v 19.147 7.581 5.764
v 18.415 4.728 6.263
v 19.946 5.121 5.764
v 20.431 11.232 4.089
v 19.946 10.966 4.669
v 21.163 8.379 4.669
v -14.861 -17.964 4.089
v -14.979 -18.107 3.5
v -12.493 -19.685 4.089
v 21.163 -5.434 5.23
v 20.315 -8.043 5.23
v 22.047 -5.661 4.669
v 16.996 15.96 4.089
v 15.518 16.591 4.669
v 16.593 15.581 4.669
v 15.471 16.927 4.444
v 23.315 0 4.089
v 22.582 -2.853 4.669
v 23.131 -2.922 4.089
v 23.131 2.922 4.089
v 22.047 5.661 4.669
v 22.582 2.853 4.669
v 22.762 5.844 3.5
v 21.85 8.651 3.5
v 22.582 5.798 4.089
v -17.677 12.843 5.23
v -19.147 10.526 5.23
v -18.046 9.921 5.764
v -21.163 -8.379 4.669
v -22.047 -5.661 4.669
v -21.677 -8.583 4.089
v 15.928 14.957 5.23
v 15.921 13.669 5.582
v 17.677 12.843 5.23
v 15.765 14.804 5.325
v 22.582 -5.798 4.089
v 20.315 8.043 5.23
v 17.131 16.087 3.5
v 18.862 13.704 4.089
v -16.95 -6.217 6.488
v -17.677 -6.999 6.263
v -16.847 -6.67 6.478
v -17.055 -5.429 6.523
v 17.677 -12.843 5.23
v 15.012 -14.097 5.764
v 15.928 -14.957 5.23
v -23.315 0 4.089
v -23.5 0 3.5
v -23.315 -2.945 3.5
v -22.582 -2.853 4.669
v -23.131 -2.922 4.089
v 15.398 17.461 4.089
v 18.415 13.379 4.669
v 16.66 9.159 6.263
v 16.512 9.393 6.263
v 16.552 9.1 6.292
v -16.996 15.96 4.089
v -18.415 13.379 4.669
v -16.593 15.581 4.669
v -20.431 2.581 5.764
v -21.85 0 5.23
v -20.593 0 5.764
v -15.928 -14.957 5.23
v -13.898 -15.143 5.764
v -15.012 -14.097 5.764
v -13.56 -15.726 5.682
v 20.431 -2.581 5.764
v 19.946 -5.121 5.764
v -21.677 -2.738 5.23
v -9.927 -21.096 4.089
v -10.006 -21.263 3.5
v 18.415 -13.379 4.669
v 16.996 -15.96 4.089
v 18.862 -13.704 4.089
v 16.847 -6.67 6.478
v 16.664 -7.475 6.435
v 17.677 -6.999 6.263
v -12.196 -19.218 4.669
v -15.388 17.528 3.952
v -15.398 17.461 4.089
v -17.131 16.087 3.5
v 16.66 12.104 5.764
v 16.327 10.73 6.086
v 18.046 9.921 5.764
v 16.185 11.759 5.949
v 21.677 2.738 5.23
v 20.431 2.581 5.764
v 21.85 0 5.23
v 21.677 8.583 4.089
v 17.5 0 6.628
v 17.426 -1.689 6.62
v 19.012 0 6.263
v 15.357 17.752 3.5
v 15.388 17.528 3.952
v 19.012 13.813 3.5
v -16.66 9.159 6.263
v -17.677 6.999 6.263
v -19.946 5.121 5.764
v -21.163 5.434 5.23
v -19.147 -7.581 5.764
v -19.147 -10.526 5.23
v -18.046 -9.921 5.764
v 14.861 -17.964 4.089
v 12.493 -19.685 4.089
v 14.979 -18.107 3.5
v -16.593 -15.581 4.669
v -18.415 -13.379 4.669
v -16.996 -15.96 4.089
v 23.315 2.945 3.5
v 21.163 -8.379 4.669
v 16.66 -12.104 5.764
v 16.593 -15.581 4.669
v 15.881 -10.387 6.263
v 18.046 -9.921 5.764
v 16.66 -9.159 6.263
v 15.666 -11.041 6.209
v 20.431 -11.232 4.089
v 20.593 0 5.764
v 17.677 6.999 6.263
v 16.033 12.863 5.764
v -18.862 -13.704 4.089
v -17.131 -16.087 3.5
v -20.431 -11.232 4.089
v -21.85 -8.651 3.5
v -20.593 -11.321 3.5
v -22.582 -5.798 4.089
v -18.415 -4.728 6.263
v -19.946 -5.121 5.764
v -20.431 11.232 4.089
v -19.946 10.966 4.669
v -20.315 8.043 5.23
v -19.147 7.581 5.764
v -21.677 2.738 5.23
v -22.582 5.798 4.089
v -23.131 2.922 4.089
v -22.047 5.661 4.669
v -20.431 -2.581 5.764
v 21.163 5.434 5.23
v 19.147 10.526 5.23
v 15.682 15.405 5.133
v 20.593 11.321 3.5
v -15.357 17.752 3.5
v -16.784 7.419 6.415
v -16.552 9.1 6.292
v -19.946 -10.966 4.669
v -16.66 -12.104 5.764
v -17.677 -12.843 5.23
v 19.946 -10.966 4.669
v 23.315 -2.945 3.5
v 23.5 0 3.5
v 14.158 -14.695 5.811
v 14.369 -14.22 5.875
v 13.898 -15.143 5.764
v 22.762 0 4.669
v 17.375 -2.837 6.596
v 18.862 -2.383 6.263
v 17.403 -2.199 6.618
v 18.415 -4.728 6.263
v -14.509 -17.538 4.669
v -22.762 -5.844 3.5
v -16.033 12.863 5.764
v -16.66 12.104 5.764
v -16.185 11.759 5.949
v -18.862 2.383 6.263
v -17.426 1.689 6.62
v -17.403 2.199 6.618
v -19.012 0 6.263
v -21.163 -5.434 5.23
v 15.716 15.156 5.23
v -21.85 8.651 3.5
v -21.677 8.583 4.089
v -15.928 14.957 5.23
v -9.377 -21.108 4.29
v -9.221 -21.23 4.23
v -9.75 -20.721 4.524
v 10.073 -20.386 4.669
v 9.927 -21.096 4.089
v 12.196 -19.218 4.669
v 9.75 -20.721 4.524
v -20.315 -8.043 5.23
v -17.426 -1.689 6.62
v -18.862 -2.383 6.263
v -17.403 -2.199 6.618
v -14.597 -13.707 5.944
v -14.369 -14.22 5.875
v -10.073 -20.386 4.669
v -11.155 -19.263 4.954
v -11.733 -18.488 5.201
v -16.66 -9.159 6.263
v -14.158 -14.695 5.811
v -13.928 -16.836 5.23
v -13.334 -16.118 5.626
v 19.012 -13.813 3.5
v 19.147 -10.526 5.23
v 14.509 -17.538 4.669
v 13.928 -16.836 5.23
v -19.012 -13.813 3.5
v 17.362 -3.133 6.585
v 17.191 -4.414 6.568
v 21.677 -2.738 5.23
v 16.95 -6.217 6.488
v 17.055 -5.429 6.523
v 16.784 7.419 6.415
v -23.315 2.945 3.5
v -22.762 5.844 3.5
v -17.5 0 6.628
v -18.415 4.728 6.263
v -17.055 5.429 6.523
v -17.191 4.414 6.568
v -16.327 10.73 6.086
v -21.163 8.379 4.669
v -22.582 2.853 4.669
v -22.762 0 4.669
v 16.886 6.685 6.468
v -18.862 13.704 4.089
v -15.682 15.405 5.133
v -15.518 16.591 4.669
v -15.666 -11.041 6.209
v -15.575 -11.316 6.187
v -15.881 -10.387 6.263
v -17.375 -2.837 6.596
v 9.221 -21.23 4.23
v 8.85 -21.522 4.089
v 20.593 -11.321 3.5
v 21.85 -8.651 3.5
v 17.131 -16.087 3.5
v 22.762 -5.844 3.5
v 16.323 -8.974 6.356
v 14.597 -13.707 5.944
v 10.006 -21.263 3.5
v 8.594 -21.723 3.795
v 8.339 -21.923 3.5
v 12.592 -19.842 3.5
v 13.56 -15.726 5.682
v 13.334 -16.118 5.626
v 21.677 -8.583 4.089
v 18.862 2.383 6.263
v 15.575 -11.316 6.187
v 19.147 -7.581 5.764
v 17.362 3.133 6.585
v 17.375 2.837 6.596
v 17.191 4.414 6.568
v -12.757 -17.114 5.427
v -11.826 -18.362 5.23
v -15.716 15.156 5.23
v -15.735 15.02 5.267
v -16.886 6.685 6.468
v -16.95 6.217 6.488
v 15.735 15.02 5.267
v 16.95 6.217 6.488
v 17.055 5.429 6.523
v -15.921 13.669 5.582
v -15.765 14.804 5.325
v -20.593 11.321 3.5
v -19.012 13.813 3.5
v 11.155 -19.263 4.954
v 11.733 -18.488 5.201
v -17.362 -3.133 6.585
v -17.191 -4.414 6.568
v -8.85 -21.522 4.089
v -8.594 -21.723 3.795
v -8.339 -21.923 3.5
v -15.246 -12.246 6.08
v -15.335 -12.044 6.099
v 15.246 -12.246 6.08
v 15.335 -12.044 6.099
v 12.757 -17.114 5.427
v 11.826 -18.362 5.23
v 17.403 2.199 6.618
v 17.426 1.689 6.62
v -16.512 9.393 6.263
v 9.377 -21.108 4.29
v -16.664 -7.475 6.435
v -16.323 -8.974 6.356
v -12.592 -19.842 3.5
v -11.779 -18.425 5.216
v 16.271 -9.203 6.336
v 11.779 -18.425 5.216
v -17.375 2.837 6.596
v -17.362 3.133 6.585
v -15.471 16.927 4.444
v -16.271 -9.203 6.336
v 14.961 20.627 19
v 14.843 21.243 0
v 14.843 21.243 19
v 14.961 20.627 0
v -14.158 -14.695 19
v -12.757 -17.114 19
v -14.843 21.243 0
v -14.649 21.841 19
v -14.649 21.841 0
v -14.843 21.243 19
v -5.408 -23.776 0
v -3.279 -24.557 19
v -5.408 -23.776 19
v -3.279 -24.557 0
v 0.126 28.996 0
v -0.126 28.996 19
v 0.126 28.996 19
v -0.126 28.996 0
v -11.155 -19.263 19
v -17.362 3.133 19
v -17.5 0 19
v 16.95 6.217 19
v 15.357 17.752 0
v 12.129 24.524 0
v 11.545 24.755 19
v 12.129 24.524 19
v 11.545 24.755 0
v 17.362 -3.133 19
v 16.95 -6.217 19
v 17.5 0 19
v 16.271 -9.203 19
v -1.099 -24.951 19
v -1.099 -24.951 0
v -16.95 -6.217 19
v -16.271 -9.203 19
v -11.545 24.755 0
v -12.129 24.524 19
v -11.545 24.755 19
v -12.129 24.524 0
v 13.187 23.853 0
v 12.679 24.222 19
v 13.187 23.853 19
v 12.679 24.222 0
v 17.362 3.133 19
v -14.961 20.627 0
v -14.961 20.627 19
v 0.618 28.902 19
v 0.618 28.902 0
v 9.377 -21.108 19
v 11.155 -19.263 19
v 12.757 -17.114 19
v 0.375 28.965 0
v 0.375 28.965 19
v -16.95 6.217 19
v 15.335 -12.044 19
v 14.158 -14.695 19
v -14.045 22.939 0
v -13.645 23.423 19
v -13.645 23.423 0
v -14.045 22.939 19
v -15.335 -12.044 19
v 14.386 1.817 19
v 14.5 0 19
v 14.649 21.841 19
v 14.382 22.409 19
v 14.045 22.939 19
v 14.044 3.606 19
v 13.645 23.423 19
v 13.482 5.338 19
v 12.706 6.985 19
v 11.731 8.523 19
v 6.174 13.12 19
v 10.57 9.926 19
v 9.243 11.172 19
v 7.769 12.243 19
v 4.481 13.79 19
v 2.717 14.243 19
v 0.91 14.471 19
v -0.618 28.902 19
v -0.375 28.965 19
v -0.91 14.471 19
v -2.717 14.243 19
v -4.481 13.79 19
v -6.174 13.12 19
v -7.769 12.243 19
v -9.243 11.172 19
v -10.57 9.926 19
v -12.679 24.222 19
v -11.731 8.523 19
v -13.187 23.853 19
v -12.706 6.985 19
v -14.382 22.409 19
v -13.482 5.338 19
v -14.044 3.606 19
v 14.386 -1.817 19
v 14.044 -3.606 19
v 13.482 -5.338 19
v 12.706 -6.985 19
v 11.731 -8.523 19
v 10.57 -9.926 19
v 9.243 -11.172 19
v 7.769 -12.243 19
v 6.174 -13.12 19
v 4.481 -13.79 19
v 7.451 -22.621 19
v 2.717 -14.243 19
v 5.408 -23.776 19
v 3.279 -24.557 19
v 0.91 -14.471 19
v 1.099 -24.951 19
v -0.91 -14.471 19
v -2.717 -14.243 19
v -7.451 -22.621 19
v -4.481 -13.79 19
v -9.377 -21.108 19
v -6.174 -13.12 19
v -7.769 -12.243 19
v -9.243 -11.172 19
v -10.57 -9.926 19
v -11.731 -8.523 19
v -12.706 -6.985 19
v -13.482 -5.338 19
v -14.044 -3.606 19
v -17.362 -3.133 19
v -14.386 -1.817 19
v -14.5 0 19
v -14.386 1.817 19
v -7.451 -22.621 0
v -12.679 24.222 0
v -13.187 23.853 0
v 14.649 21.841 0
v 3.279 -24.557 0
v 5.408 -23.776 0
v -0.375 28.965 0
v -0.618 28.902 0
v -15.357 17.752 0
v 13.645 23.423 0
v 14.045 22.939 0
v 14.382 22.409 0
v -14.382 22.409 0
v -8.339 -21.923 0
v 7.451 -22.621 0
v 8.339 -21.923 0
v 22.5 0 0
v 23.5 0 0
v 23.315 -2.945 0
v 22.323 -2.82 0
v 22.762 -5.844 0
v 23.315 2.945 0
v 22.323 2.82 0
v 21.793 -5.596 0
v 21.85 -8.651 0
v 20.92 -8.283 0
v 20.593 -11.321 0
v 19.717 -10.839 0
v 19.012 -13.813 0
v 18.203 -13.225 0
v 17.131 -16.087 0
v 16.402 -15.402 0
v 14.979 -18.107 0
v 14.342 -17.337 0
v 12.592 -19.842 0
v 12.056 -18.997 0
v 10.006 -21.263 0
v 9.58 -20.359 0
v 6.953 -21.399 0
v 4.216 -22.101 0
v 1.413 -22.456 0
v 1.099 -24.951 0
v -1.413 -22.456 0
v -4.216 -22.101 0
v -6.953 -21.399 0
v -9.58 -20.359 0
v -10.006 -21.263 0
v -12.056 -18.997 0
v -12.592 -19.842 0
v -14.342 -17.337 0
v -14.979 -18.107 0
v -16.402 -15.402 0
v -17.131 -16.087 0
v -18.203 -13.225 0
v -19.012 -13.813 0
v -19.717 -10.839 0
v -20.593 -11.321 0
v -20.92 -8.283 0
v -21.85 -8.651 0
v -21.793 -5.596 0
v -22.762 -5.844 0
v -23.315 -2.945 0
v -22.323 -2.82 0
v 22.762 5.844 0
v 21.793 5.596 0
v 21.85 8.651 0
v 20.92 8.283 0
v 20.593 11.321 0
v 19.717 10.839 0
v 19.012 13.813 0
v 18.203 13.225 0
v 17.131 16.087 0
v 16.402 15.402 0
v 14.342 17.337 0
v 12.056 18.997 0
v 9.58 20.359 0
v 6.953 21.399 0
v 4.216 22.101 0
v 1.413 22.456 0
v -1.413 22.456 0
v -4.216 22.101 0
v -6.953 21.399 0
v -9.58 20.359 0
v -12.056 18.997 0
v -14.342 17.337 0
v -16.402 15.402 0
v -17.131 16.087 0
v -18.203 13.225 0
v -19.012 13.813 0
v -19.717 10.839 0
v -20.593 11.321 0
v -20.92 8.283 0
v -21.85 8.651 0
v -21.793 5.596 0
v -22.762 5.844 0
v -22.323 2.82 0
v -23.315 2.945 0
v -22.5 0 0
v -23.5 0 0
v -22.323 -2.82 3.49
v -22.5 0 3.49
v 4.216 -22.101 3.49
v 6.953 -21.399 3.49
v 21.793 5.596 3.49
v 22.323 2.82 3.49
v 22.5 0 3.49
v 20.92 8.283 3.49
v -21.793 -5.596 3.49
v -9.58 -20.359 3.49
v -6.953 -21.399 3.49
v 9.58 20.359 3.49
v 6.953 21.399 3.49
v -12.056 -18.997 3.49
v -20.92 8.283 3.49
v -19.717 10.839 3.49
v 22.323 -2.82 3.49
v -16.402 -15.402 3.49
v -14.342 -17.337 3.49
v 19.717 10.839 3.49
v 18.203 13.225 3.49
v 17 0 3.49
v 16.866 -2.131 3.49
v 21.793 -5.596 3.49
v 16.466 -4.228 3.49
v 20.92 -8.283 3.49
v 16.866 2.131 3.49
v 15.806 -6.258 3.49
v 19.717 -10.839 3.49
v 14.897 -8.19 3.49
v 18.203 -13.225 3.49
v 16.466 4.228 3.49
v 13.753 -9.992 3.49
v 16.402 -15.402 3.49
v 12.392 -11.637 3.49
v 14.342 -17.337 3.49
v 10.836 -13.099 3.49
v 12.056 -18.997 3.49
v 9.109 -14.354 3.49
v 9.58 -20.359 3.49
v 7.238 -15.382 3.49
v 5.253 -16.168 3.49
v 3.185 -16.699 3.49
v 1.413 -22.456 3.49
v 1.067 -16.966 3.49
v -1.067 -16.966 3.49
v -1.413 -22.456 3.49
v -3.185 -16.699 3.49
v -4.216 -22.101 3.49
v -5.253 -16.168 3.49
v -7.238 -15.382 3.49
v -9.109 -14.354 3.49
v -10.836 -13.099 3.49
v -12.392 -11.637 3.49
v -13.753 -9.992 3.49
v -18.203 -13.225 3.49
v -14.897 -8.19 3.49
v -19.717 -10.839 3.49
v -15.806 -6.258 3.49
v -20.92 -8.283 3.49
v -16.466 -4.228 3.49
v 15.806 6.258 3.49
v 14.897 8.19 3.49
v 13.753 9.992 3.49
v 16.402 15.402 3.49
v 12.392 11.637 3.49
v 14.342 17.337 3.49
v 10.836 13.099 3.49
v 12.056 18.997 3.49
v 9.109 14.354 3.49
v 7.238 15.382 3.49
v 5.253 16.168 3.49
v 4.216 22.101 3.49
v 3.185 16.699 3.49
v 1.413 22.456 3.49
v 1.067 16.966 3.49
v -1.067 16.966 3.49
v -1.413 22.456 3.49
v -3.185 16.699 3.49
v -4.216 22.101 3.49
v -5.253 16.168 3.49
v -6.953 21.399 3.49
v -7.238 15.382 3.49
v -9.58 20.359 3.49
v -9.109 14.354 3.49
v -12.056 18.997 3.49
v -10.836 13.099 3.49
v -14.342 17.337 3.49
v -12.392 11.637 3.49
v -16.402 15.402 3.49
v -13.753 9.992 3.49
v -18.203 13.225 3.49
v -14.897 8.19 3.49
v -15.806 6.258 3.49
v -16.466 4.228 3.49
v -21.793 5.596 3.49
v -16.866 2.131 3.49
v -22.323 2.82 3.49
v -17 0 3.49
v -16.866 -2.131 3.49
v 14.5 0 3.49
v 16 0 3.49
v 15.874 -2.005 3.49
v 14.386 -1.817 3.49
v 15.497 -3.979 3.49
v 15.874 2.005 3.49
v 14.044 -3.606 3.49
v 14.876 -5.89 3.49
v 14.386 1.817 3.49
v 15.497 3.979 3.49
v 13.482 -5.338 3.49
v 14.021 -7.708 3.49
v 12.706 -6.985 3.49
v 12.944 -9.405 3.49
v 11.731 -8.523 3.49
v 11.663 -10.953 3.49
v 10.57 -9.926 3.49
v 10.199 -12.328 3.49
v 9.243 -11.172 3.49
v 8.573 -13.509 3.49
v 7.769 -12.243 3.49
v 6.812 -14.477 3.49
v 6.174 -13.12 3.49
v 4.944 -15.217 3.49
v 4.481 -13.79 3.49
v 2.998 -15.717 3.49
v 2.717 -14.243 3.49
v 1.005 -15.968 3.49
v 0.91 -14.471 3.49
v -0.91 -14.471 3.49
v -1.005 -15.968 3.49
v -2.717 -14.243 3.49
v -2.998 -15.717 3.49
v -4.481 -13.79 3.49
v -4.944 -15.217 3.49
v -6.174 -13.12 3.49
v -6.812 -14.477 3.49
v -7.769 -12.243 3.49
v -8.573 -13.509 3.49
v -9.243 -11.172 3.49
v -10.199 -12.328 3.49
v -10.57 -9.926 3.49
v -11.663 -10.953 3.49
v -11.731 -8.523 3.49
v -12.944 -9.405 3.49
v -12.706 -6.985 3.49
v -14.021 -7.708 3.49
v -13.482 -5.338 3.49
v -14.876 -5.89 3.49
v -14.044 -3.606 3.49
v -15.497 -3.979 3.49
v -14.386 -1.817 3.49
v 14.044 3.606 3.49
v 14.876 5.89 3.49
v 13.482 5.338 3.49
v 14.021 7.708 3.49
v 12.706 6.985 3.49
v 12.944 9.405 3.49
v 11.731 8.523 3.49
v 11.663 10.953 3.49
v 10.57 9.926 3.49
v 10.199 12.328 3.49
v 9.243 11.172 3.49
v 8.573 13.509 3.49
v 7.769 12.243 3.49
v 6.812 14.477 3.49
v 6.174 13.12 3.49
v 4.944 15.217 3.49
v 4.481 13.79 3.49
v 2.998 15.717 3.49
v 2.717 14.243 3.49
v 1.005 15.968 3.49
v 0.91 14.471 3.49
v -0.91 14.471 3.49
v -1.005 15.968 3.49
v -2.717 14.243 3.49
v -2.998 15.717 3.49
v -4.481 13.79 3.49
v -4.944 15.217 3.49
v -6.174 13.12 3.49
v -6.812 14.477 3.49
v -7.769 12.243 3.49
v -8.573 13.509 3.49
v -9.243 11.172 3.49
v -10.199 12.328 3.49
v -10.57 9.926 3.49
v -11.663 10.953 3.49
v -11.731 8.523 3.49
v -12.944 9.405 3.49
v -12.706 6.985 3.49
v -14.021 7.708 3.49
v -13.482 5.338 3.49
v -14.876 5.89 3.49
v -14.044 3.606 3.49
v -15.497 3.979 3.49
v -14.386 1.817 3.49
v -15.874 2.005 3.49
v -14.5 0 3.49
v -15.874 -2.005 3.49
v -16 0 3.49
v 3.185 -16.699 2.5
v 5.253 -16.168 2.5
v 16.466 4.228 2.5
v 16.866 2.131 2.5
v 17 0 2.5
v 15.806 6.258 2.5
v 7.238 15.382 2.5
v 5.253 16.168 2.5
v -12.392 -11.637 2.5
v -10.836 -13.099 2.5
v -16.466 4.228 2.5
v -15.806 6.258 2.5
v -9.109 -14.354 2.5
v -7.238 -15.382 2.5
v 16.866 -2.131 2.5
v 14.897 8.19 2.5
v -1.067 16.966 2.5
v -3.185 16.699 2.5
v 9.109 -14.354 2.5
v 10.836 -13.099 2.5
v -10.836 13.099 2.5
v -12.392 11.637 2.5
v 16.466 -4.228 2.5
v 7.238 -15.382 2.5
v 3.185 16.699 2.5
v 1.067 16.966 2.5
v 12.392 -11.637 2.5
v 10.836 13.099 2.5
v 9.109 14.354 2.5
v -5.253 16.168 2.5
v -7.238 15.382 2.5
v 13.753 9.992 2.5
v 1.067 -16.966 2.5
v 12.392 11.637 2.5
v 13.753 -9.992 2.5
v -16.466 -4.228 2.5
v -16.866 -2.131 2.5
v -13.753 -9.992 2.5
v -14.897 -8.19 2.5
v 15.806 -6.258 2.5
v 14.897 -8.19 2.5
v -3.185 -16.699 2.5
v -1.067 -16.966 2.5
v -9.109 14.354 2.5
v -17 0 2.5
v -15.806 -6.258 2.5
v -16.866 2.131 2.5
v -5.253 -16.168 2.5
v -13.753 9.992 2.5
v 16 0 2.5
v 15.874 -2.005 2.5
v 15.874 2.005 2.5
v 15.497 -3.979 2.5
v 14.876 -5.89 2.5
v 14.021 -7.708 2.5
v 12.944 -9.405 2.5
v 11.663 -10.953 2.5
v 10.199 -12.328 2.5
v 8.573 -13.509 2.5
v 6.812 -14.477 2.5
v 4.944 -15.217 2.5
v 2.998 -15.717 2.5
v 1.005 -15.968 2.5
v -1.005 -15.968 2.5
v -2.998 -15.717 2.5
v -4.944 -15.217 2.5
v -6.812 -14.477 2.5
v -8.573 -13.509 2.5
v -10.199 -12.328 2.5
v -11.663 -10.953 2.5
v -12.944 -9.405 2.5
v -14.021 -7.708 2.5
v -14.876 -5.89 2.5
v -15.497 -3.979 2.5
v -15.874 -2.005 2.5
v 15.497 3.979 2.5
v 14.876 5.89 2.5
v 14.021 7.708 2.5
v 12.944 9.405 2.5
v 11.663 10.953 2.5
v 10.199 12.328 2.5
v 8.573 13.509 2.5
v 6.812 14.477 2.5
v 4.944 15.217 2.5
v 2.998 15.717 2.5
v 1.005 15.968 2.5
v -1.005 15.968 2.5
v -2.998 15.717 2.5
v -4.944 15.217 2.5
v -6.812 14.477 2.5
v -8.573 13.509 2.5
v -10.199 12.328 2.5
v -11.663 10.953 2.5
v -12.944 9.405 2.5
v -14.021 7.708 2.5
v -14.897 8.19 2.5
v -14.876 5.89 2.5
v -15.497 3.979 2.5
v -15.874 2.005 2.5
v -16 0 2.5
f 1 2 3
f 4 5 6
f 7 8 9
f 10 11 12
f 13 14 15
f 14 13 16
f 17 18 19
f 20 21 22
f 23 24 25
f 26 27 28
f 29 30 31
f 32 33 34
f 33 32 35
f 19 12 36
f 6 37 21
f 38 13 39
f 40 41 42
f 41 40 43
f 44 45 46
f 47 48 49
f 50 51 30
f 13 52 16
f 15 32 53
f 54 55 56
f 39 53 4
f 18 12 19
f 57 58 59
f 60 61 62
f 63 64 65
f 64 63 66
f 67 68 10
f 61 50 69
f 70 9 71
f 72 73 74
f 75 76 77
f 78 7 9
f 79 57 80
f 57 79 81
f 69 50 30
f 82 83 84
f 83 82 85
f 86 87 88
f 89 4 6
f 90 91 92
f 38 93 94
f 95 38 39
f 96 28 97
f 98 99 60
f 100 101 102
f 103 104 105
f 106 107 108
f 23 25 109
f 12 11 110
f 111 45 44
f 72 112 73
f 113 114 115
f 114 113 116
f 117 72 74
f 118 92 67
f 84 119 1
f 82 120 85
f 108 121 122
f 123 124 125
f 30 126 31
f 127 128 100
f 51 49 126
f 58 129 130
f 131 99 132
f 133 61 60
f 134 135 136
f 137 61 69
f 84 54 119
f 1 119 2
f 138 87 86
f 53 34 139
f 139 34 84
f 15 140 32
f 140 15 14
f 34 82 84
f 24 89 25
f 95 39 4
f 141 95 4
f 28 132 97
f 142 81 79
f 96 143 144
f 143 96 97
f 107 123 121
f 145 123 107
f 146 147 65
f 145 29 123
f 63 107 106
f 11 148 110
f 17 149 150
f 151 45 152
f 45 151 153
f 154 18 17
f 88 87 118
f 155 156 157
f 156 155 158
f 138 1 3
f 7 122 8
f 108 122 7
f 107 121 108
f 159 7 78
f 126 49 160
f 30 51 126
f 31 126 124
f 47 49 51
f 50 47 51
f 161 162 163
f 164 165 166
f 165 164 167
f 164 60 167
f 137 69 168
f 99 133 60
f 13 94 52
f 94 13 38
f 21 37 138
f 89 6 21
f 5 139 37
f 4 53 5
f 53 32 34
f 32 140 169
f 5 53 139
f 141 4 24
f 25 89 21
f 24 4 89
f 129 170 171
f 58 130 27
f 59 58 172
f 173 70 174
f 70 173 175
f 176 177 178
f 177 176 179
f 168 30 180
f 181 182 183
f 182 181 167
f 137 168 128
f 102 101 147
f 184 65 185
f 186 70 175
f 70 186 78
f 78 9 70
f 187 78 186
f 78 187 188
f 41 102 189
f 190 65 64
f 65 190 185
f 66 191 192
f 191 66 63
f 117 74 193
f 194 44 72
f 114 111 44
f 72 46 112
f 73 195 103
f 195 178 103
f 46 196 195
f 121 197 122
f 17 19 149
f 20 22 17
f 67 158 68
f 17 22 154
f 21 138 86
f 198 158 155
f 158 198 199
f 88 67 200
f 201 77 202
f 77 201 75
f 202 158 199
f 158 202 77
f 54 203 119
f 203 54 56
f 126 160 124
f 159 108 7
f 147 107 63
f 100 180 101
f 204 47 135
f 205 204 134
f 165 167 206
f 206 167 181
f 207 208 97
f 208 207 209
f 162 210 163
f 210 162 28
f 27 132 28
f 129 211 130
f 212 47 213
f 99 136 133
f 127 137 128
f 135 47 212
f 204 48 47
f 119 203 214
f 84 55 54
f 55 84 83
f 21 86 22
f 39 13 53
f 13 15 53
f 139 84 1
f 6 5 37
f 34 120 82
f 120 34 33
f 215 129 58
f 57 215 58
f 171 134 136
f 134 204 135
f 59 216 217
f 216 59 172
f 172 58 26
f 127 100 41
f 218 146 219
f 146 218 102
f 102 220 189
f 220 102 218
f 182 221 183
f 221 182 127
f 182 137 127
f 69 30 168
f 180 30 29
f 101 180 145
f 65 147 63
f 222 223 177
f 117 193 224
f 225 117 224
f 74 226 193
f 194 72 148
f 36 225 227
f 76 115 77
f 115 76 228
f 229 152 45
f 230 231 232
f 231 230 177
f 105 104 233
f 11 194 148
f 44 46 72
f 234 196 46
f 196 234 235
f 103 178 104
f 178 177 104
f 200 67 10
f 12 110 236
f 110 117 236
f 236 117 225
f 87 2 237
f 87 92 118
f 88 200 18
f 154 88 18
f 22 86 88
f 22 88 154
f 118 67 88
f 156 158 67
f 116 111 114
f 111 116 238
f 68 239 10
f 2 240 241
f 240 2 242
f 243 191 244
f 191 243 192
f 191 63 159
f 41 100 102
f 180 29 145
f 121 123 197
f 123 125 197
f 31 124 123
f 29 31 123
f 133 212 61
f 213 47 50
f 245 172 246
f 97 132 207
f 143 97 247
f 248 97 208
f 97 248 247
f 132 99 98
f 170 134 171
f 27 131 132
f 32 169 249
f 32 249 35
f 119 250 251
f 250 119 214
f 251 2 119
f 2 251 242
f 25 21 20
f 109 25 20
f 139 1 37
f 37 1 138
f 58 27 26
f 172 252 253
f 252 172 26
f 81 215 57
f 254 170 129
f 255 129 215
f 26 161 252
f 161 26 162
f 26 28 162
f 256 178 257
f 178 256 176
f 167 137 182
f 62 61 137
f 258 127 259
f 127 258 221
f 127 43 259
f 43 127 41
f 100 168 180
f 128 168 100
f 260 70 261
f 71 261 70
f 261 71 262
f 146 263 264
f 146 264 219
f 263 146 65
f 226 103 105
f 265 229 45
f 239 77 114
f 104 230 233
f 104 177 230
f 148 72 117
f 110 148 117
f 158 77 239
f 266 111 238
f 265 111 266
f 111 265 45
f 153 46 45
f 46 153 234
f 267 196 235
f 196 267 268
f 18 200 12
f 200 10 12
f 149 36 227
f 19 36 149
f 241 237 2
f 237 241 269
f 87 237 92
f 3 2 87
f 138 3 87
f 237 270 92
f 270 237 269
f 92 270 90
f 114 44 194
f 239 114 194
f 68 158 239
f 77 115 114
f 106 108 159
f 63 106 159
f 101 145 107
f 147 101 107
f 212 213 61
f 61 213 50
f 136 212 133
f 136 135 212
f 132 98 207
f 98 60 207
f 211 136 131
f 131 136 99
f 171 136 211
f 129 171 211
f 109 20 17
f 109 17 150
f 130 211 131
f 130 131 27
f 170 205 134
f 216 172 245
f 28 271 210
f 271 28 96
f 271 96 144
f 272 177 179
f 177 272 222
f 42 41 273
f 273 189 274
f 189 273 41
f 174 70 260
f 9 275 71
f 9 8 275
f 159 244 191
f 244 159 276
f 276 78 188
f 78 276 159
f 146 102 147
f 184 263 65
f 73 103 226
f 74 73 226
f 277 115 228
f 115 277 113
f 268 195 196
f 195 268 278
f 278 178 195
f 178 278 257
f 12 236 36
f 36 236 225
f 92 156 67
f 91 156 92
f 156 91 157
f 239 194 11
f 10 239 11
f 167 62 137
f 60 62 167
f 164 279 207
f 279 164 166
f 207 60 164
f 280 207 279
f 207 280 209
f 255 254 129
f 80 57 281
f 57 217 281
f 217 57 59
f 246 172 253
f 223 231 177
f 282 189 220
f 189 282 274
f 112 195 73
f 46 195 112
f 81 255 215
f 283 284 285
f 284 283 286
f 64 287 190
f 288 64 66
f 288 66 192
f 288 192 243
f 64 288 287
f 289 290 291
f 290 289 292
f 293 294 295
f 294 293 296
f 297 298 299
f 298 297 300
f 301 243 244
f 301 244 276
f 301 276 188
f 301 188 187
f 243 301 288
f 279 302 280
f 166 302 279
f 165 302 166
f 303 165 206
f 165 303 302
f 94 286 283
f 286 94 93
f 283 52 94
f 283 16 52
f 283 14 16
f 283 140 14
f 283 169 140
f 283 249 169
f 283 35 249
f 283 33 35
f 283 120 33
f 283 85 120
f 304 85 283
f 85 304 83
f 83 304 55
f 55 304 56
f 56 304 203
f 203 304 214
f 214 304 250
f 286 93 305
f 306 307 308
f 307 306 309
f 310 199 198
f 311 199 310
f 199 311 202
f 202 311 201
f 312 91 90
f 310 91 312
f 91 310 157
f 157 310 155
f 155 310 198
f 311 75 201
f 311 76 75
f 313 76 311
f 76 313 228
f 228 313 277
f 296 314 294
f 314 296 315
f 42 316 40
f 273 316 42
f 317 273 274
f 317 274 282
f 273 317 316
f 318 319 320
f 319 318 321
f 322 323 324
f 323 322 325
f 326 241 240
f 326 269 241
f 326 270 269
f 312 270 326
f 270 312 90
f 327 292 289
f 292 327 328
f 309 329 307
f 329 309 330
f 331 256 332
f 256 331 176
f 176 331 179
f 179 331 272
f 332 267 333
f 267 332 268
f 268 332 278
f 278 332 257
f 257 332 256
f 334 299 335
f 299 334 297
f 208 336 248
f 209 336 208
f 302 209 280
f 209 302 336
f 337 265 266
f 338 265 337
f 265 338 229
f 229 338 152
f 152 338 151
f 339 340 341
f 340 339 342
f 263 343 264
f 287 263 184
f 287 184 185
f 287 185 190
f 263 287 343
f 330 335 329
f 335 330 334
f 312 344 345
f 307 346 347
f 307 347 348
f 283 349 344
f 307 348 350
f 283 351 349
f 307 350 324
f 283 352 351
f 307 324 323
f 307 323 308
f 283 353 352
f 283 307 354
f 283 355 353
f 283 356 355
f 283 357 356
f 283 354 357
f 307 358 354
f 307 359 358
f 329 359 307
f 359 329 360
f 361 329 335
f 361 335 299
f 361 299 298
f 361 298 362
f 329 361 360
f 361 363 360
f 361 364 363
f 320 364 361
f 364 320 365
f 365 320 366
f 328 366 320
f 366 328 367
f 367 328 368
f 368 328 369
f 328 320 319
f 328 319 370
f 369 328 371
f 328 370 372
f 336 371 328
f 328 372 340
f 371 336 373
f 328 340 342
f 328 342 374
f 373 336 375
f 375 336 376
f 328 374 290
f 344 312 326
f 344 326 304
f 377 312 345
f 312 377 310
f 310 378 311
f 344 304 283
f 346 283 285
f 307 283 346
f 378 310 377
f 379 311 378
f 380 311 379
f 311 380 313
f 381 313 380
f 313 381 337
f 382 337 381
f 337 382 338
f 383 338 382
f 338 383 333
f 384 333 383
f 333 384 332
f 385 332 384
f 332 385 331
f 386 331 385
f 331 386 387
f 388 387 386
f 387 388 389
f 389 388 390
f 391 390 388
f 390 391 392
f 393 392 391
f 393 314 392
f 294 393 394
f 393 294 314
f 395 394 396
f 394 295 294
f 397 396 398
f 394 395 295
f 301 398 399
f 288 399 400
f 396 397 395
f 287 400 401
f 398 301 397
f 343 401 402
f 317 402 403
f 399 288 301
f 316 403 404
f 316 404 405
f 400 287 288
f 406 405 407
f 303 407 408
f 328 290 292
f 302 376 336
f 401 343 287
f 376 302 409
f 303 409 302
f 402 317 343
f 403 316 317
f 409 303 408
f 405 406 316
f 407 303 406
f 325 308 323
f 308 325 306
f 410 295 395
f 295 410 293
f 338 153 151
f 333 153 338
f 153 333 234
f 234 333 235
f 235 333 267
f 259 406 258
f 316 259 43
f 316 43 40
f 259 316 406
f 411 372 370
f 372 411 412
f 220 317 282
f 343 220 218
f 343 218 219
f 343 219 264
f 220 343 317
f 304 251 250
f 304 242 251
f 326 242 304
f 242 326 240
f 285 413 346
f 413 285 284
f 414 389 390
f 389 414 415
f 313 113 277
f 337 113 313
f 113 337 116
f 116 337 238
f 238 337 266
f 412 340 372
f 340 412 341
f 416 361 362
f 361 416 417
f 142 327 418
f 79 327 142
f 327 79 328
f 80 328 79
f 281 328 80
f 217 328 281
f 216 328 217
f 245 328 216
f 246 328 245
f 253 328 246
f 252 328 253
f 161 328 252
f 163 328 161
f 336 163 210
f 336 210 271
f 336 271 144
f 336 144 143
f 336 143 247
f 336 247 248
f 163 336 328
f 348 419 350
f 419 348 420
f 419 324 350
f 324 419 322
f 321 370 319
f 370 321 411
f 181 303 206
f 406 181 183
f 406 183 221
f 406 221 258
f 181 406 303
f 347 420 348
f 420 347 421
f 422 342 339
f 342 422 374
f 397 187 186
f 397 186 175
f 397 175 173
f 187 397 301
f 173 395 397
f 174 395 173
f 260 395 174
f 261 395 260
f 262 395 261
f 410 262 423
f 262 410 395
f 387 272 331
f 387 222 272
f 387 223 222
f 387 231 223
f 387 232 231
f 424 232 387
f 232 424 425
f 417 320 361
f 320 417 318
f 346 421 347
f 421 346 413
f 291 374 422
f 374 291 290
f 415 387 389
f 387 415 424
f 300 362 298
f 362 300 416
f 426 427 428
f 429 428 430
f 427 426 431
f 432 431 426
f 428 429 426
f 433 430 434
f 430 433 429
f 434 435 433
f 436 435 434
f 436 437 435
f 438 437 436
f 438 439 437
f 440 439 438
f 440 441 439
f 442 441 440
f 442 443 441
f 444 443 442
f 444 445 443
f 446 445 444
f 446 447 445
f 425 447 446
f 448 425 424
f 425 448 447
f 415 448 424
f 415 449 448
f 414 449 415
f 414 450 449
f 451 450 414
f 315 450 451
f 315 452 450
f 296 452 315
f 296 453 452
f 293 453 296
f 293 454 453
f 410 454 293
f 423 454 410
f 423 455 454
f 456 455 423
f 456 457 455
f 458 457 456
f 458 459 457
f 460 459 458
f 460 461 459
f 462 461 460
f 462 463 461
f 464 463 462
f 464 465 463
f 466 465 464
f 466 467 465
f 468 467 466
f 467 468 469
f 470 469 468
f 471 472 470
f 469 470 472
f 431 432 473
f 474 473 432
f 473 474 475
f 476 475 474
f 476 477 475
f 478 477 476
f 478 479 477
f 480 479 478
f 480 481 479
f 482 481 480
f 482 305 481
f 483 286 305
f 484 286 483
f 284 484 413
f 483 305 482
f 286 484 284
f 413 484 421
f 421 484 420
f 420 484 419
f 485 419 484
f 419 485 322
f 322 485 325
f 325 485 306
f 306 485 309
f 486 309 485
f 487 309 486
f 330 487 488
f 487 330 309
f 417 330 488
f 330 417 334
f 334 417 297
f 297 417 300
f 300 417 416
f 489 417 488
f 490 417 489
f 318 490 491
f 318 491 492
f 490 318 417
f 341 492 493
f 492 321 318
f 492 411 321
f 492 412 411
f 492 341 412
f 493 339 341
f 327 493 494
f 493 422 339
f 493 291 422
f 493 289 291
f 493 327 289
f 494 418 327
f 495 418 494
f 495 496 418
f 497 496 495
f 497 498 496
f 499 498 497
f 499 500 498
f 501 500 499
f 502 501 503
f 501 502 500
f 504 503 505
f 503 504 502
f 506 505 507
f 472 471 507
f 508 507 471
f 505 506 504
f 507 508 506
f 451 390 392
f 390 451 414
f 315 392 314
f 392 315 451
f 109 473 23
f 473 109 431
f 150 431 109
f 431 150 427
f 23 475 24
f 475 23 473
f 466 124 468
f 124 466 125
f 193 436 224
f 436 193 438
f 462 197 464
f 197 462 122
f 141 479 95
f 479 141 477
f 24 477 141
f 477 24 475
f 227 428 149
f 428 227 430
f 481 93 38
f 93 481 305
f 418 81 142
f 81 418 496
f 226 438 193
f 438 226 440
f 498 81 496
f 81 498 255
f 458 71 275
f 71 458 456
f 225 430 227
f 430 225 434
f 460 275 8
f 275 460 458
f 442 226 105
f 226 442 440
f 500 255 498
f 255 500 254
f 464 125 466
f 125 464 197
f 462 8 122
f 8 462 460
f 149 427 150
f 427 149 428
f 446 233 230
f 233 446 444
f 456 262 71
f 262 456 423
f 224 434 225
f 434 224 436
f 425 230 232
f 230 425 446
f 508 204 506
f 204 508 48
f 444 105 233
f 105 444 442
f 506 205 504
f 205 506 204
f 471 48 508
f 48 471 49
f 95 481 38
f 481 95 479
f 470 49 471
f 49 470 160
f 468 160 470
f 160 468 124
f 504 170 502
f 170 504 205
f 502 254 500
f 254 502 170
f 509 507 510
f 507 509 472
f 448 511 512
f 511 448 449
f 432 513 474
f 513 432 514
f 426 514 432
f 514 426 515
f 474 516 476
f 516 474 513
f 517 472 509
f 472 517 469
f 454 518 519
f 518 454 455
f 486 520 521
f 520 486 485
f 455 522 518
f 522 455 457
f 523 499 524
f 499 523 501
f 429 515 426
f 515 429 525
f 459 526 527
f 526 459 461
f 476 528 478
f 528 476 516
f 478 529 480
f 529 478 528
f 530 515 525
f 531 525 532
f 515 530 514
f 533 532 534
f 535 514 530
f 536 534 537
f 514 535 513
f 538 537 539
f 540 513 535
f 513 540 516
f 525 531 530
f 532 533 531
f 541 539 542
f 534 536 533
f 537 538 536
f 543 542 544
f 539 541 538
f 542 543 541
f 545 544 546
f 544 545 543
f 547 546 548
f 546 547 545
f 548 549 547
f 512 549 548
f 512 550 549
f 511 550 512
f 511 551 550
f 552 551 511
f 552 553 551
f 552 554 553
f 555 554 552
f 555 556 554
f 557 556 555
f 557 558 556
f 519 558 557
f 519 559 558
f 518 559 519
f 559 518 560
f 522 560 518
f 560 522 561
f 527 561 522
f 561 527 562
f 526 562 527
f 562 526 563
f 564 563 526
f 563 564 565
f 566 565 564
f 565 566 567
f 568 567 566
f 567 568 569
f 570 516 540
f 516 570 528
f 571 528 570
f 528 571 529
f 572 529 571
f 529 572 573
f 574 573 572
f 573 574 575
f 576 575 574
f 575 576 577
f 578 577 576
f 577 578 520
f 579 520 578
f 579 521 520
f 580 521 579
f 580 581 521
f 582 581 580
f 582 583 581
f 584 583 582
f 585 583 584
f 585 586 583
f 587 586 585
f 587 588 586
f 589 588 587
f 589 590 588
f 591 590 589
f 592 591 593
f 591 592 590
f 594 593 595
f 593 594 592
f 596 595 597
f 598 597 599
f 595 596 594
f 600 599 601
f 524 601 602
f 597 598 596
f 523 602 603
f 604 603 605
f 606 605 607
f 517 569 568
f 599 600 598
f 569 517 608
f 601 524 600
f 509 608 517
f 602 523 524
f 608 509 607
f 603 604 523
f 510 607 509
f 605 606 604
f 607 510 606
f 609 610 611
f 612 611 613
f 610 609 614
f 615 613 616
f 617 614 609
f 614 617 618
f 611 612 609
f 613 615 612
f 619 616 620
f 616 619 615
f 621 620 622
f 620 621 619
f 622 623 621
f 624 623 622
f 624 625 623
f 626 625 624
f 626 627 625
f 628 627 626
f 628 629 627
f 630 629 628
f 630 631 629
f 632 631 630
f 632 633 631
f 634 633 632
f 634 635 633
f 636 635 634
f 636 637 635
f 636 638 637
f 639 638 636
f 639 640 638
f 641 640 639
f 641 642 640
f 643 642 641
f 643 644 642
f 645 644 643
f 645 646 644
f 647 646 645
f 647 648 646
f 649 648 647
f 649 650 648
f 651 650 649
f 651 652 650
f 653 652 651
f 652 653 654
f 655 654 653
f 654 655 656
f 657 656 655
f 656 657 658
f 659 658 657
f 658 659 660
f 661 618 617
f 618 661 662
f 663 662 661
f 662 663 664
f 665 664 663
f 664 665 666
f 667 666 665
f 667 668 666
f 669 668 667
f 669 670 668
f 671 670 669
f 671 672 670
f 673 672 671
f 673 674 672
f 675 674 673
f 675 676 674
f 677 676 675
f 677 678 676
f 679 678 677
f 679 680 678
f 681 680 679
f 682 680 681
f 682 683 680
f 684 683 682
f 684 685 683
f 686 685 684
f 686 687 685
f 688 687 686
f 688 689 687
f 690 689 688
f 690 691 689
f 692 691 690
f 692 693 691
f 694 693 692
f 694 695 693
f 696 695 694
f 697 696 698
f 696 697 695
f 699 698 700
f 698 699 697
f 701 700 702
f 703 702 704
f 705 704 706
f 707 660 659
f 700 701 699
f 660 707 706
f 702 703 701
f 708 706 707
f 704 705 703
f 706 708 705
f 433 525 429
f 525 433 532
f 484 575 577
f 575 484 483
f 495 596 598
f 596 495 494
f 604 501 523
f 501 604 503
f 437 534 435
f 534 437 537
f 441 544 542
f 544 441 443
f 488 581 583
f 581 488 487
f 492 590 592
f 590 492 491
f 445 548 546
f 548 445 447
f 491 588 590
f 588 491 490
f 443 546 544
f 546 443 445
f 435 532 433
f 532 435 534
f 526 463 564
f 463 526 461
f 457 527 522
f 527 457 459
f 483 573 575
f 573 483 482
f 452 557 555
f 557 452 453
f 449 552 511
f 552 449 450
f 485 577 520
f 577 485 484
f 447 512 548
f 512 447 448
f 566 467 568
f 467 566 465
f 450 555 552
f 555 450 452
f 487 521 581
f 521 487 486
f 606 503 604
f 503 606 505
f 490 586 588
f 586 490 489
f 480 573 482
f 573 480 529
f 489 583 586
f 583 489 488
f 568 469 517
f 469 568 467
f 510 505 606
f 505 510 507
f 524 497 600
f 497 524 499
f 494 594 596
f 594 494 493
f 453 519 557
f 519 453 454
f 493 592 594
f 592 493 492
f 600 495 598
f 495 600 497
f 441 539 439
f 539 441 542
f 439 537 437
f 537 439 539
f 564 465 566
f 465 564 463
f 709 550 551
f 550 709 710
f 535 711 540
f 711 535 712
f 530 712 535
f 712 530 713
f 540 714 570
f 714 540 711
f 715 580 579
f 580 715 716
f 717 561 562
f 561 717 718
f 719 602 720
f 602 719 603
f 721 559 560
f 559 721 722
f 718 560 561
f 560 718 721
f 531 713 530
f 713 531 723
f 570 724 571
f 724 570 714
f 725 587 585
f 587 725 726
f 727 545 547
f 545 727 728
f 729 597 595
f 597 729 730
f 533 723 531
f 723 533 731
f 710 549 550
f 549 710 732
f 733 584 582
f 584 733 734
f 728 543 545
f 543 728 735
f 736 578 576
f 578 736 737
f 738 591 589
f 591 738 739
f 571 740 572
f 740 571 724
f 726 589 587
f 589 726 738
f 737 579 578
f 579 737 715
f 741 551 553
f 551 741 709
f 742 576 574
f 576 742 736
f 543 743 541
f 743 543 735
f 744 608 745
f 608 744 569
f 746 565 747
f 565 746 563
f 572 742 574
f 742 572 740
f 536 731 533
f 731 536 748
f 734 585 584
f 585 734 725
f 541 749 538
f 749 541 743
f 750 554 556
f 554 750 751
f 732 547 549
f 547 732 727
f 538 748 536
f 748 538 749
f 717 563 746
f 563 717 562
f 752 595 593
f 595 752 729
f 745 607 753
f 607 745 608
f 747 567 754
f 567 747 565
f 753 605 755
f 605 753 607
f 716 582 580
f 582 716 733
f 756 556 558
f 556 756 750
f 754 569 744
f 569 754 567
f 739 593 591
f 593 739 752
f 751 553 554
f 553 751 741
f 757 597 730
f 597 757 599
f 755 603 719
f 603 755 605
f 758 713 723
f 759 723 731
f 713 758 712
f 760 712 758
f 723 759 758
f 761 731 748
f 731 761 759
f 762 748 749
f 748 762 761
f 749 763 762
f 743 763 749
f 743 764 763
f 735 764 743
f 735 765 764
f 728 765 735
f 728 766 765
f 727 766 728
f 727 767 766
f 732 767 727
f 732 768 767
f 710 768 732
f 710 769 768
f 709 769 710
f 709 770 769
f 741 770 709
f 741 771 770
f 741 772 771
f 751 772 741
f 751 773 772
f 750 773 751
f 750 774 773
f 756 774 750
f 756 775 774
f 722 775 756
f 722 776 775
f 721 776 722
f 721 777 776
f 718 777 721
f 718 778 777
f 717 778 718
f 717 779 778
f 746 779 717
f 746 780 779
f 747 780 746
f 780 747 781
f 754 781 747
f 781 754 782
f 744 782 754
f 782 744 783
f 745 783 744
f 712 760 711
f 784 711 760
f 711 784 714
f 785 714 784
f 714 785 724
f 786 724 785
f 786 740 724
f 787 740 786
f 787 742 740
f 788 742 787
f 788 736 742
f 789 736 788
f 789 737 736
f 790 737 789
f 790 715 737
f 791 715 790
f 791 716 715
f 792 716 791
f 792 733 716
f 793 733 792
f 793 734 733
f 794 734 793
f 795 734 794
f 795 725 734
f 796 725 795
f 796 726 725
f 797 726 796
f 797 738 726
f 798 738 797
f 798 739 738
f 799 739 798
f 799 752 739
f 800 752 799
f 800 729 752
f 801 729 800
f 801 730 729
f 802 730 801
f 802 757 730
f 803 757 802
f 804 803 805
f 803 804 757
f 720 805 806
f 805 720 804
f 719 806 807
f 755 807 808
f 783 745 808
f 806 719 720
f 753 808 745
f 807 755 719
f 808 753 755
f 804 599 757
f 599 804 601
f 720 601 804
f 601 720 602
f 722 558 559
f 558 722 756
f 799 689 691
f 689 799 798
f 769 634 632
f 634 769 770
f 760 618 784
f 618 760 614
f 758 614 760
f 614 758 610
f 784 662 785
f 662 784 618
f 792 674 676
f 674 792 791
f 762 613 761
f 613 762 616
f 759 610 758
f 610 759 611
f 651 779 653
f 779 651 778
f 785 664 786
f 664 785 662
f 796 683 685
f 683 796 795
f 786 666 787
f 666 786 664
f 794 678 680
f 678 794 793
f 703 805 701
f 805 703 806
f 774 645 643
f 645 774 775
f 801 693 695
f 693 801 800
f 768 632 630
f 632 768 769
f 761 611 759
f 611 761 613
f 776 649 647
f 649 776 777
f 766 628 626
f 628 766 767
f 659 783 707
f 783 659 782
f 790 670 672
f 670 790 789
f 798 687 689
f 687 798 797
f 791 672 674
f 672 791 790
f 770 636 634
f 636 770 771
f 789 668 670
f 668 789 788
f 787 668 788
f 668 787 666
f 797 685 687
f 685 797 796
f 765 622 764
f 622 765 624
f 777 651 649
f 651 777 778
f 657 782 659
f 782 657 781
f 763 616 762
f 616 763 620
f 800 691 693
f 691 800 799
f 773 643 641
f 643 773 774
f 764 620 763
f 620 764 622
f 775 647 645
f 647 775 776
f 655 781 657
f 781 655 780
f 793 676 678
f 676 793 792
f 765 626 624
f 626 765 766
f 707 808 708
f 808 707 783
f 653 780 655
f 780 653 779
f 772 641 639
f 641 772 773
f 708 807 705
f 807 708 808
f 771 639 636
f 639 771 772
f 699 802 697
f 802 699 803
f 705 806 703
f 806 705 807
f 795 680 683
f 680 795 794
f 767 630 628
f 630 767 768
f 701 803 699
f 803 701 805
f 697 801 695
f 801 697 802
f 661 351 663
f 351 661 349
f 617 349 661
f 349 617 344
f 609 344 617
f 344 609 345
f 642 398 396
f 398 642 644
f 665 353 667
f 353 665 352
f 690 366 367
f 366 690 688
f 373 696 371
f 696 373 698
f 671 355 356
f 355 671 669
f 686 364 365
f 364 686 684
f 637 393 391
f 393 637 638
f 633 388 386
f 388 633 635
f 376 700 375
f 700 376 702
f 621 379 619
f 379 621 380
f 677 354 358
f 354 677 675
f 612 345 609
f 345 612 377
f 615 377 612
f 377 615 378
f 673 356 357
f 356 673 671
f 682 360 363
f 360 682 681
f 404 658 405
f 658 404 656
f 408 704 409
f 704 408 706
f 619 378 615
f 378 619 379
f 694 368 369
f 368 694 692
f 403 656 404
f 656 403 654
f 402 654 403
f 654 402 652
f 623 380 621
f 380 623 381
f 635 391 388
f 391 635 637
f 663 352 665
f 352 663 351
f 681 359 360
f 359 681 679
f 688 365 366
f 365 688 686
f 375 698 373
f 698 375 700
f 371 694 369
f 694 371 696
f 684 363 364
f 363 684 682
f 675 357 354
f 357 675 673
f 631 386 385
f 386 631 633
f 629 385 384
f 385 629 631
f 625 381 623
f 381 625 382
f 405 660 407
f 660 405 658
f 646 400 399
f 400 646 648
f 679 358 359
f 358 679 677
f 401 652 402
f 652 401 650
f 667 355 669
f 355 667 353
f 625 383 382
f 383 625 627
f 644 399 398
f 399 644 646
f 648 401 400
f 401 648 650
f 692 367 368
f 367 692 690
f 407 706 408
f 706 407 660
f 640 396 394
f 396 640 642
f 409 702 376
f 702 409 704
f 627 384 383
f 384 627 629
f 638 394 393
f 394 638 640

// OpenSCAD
$fn=50;

module neck(height)
{
	hull()
	{
		scale([1,50/35,1]) cylinder(h=height, d=35);
		translate([10,20,0]) cylinder(h=height, d=10);
		translate([-10,20,0]) cylinder(h=height, d=10);
		translate([0,27,0]) cylinder(h=height, d=4);
	}
}
module base()
{
	difference() 
	{
		union()
		{
			neck(4+15);
			cylinder(h=3.5, d=47);
			translate([0,0,3.5]) scale([1,1,0.2]) difference()
			{
				sphere(d=47);
				translate([0,0,-47/2]) cube(47, center=true);
			}
		}		
		translate([0,0,-0.01]) cylinder(h=3.5, d=45);
		
	}
	translate([0,0,2.5]) difference() 
	{
		cylinder(h=1, d=34);
		translate([0,0,-0.01]) cylinder(h=2, d=32);
	}
}

difference()
{
	base();
	translate([0,0,-0.01]) cylinder(h=100, d=29);
}
